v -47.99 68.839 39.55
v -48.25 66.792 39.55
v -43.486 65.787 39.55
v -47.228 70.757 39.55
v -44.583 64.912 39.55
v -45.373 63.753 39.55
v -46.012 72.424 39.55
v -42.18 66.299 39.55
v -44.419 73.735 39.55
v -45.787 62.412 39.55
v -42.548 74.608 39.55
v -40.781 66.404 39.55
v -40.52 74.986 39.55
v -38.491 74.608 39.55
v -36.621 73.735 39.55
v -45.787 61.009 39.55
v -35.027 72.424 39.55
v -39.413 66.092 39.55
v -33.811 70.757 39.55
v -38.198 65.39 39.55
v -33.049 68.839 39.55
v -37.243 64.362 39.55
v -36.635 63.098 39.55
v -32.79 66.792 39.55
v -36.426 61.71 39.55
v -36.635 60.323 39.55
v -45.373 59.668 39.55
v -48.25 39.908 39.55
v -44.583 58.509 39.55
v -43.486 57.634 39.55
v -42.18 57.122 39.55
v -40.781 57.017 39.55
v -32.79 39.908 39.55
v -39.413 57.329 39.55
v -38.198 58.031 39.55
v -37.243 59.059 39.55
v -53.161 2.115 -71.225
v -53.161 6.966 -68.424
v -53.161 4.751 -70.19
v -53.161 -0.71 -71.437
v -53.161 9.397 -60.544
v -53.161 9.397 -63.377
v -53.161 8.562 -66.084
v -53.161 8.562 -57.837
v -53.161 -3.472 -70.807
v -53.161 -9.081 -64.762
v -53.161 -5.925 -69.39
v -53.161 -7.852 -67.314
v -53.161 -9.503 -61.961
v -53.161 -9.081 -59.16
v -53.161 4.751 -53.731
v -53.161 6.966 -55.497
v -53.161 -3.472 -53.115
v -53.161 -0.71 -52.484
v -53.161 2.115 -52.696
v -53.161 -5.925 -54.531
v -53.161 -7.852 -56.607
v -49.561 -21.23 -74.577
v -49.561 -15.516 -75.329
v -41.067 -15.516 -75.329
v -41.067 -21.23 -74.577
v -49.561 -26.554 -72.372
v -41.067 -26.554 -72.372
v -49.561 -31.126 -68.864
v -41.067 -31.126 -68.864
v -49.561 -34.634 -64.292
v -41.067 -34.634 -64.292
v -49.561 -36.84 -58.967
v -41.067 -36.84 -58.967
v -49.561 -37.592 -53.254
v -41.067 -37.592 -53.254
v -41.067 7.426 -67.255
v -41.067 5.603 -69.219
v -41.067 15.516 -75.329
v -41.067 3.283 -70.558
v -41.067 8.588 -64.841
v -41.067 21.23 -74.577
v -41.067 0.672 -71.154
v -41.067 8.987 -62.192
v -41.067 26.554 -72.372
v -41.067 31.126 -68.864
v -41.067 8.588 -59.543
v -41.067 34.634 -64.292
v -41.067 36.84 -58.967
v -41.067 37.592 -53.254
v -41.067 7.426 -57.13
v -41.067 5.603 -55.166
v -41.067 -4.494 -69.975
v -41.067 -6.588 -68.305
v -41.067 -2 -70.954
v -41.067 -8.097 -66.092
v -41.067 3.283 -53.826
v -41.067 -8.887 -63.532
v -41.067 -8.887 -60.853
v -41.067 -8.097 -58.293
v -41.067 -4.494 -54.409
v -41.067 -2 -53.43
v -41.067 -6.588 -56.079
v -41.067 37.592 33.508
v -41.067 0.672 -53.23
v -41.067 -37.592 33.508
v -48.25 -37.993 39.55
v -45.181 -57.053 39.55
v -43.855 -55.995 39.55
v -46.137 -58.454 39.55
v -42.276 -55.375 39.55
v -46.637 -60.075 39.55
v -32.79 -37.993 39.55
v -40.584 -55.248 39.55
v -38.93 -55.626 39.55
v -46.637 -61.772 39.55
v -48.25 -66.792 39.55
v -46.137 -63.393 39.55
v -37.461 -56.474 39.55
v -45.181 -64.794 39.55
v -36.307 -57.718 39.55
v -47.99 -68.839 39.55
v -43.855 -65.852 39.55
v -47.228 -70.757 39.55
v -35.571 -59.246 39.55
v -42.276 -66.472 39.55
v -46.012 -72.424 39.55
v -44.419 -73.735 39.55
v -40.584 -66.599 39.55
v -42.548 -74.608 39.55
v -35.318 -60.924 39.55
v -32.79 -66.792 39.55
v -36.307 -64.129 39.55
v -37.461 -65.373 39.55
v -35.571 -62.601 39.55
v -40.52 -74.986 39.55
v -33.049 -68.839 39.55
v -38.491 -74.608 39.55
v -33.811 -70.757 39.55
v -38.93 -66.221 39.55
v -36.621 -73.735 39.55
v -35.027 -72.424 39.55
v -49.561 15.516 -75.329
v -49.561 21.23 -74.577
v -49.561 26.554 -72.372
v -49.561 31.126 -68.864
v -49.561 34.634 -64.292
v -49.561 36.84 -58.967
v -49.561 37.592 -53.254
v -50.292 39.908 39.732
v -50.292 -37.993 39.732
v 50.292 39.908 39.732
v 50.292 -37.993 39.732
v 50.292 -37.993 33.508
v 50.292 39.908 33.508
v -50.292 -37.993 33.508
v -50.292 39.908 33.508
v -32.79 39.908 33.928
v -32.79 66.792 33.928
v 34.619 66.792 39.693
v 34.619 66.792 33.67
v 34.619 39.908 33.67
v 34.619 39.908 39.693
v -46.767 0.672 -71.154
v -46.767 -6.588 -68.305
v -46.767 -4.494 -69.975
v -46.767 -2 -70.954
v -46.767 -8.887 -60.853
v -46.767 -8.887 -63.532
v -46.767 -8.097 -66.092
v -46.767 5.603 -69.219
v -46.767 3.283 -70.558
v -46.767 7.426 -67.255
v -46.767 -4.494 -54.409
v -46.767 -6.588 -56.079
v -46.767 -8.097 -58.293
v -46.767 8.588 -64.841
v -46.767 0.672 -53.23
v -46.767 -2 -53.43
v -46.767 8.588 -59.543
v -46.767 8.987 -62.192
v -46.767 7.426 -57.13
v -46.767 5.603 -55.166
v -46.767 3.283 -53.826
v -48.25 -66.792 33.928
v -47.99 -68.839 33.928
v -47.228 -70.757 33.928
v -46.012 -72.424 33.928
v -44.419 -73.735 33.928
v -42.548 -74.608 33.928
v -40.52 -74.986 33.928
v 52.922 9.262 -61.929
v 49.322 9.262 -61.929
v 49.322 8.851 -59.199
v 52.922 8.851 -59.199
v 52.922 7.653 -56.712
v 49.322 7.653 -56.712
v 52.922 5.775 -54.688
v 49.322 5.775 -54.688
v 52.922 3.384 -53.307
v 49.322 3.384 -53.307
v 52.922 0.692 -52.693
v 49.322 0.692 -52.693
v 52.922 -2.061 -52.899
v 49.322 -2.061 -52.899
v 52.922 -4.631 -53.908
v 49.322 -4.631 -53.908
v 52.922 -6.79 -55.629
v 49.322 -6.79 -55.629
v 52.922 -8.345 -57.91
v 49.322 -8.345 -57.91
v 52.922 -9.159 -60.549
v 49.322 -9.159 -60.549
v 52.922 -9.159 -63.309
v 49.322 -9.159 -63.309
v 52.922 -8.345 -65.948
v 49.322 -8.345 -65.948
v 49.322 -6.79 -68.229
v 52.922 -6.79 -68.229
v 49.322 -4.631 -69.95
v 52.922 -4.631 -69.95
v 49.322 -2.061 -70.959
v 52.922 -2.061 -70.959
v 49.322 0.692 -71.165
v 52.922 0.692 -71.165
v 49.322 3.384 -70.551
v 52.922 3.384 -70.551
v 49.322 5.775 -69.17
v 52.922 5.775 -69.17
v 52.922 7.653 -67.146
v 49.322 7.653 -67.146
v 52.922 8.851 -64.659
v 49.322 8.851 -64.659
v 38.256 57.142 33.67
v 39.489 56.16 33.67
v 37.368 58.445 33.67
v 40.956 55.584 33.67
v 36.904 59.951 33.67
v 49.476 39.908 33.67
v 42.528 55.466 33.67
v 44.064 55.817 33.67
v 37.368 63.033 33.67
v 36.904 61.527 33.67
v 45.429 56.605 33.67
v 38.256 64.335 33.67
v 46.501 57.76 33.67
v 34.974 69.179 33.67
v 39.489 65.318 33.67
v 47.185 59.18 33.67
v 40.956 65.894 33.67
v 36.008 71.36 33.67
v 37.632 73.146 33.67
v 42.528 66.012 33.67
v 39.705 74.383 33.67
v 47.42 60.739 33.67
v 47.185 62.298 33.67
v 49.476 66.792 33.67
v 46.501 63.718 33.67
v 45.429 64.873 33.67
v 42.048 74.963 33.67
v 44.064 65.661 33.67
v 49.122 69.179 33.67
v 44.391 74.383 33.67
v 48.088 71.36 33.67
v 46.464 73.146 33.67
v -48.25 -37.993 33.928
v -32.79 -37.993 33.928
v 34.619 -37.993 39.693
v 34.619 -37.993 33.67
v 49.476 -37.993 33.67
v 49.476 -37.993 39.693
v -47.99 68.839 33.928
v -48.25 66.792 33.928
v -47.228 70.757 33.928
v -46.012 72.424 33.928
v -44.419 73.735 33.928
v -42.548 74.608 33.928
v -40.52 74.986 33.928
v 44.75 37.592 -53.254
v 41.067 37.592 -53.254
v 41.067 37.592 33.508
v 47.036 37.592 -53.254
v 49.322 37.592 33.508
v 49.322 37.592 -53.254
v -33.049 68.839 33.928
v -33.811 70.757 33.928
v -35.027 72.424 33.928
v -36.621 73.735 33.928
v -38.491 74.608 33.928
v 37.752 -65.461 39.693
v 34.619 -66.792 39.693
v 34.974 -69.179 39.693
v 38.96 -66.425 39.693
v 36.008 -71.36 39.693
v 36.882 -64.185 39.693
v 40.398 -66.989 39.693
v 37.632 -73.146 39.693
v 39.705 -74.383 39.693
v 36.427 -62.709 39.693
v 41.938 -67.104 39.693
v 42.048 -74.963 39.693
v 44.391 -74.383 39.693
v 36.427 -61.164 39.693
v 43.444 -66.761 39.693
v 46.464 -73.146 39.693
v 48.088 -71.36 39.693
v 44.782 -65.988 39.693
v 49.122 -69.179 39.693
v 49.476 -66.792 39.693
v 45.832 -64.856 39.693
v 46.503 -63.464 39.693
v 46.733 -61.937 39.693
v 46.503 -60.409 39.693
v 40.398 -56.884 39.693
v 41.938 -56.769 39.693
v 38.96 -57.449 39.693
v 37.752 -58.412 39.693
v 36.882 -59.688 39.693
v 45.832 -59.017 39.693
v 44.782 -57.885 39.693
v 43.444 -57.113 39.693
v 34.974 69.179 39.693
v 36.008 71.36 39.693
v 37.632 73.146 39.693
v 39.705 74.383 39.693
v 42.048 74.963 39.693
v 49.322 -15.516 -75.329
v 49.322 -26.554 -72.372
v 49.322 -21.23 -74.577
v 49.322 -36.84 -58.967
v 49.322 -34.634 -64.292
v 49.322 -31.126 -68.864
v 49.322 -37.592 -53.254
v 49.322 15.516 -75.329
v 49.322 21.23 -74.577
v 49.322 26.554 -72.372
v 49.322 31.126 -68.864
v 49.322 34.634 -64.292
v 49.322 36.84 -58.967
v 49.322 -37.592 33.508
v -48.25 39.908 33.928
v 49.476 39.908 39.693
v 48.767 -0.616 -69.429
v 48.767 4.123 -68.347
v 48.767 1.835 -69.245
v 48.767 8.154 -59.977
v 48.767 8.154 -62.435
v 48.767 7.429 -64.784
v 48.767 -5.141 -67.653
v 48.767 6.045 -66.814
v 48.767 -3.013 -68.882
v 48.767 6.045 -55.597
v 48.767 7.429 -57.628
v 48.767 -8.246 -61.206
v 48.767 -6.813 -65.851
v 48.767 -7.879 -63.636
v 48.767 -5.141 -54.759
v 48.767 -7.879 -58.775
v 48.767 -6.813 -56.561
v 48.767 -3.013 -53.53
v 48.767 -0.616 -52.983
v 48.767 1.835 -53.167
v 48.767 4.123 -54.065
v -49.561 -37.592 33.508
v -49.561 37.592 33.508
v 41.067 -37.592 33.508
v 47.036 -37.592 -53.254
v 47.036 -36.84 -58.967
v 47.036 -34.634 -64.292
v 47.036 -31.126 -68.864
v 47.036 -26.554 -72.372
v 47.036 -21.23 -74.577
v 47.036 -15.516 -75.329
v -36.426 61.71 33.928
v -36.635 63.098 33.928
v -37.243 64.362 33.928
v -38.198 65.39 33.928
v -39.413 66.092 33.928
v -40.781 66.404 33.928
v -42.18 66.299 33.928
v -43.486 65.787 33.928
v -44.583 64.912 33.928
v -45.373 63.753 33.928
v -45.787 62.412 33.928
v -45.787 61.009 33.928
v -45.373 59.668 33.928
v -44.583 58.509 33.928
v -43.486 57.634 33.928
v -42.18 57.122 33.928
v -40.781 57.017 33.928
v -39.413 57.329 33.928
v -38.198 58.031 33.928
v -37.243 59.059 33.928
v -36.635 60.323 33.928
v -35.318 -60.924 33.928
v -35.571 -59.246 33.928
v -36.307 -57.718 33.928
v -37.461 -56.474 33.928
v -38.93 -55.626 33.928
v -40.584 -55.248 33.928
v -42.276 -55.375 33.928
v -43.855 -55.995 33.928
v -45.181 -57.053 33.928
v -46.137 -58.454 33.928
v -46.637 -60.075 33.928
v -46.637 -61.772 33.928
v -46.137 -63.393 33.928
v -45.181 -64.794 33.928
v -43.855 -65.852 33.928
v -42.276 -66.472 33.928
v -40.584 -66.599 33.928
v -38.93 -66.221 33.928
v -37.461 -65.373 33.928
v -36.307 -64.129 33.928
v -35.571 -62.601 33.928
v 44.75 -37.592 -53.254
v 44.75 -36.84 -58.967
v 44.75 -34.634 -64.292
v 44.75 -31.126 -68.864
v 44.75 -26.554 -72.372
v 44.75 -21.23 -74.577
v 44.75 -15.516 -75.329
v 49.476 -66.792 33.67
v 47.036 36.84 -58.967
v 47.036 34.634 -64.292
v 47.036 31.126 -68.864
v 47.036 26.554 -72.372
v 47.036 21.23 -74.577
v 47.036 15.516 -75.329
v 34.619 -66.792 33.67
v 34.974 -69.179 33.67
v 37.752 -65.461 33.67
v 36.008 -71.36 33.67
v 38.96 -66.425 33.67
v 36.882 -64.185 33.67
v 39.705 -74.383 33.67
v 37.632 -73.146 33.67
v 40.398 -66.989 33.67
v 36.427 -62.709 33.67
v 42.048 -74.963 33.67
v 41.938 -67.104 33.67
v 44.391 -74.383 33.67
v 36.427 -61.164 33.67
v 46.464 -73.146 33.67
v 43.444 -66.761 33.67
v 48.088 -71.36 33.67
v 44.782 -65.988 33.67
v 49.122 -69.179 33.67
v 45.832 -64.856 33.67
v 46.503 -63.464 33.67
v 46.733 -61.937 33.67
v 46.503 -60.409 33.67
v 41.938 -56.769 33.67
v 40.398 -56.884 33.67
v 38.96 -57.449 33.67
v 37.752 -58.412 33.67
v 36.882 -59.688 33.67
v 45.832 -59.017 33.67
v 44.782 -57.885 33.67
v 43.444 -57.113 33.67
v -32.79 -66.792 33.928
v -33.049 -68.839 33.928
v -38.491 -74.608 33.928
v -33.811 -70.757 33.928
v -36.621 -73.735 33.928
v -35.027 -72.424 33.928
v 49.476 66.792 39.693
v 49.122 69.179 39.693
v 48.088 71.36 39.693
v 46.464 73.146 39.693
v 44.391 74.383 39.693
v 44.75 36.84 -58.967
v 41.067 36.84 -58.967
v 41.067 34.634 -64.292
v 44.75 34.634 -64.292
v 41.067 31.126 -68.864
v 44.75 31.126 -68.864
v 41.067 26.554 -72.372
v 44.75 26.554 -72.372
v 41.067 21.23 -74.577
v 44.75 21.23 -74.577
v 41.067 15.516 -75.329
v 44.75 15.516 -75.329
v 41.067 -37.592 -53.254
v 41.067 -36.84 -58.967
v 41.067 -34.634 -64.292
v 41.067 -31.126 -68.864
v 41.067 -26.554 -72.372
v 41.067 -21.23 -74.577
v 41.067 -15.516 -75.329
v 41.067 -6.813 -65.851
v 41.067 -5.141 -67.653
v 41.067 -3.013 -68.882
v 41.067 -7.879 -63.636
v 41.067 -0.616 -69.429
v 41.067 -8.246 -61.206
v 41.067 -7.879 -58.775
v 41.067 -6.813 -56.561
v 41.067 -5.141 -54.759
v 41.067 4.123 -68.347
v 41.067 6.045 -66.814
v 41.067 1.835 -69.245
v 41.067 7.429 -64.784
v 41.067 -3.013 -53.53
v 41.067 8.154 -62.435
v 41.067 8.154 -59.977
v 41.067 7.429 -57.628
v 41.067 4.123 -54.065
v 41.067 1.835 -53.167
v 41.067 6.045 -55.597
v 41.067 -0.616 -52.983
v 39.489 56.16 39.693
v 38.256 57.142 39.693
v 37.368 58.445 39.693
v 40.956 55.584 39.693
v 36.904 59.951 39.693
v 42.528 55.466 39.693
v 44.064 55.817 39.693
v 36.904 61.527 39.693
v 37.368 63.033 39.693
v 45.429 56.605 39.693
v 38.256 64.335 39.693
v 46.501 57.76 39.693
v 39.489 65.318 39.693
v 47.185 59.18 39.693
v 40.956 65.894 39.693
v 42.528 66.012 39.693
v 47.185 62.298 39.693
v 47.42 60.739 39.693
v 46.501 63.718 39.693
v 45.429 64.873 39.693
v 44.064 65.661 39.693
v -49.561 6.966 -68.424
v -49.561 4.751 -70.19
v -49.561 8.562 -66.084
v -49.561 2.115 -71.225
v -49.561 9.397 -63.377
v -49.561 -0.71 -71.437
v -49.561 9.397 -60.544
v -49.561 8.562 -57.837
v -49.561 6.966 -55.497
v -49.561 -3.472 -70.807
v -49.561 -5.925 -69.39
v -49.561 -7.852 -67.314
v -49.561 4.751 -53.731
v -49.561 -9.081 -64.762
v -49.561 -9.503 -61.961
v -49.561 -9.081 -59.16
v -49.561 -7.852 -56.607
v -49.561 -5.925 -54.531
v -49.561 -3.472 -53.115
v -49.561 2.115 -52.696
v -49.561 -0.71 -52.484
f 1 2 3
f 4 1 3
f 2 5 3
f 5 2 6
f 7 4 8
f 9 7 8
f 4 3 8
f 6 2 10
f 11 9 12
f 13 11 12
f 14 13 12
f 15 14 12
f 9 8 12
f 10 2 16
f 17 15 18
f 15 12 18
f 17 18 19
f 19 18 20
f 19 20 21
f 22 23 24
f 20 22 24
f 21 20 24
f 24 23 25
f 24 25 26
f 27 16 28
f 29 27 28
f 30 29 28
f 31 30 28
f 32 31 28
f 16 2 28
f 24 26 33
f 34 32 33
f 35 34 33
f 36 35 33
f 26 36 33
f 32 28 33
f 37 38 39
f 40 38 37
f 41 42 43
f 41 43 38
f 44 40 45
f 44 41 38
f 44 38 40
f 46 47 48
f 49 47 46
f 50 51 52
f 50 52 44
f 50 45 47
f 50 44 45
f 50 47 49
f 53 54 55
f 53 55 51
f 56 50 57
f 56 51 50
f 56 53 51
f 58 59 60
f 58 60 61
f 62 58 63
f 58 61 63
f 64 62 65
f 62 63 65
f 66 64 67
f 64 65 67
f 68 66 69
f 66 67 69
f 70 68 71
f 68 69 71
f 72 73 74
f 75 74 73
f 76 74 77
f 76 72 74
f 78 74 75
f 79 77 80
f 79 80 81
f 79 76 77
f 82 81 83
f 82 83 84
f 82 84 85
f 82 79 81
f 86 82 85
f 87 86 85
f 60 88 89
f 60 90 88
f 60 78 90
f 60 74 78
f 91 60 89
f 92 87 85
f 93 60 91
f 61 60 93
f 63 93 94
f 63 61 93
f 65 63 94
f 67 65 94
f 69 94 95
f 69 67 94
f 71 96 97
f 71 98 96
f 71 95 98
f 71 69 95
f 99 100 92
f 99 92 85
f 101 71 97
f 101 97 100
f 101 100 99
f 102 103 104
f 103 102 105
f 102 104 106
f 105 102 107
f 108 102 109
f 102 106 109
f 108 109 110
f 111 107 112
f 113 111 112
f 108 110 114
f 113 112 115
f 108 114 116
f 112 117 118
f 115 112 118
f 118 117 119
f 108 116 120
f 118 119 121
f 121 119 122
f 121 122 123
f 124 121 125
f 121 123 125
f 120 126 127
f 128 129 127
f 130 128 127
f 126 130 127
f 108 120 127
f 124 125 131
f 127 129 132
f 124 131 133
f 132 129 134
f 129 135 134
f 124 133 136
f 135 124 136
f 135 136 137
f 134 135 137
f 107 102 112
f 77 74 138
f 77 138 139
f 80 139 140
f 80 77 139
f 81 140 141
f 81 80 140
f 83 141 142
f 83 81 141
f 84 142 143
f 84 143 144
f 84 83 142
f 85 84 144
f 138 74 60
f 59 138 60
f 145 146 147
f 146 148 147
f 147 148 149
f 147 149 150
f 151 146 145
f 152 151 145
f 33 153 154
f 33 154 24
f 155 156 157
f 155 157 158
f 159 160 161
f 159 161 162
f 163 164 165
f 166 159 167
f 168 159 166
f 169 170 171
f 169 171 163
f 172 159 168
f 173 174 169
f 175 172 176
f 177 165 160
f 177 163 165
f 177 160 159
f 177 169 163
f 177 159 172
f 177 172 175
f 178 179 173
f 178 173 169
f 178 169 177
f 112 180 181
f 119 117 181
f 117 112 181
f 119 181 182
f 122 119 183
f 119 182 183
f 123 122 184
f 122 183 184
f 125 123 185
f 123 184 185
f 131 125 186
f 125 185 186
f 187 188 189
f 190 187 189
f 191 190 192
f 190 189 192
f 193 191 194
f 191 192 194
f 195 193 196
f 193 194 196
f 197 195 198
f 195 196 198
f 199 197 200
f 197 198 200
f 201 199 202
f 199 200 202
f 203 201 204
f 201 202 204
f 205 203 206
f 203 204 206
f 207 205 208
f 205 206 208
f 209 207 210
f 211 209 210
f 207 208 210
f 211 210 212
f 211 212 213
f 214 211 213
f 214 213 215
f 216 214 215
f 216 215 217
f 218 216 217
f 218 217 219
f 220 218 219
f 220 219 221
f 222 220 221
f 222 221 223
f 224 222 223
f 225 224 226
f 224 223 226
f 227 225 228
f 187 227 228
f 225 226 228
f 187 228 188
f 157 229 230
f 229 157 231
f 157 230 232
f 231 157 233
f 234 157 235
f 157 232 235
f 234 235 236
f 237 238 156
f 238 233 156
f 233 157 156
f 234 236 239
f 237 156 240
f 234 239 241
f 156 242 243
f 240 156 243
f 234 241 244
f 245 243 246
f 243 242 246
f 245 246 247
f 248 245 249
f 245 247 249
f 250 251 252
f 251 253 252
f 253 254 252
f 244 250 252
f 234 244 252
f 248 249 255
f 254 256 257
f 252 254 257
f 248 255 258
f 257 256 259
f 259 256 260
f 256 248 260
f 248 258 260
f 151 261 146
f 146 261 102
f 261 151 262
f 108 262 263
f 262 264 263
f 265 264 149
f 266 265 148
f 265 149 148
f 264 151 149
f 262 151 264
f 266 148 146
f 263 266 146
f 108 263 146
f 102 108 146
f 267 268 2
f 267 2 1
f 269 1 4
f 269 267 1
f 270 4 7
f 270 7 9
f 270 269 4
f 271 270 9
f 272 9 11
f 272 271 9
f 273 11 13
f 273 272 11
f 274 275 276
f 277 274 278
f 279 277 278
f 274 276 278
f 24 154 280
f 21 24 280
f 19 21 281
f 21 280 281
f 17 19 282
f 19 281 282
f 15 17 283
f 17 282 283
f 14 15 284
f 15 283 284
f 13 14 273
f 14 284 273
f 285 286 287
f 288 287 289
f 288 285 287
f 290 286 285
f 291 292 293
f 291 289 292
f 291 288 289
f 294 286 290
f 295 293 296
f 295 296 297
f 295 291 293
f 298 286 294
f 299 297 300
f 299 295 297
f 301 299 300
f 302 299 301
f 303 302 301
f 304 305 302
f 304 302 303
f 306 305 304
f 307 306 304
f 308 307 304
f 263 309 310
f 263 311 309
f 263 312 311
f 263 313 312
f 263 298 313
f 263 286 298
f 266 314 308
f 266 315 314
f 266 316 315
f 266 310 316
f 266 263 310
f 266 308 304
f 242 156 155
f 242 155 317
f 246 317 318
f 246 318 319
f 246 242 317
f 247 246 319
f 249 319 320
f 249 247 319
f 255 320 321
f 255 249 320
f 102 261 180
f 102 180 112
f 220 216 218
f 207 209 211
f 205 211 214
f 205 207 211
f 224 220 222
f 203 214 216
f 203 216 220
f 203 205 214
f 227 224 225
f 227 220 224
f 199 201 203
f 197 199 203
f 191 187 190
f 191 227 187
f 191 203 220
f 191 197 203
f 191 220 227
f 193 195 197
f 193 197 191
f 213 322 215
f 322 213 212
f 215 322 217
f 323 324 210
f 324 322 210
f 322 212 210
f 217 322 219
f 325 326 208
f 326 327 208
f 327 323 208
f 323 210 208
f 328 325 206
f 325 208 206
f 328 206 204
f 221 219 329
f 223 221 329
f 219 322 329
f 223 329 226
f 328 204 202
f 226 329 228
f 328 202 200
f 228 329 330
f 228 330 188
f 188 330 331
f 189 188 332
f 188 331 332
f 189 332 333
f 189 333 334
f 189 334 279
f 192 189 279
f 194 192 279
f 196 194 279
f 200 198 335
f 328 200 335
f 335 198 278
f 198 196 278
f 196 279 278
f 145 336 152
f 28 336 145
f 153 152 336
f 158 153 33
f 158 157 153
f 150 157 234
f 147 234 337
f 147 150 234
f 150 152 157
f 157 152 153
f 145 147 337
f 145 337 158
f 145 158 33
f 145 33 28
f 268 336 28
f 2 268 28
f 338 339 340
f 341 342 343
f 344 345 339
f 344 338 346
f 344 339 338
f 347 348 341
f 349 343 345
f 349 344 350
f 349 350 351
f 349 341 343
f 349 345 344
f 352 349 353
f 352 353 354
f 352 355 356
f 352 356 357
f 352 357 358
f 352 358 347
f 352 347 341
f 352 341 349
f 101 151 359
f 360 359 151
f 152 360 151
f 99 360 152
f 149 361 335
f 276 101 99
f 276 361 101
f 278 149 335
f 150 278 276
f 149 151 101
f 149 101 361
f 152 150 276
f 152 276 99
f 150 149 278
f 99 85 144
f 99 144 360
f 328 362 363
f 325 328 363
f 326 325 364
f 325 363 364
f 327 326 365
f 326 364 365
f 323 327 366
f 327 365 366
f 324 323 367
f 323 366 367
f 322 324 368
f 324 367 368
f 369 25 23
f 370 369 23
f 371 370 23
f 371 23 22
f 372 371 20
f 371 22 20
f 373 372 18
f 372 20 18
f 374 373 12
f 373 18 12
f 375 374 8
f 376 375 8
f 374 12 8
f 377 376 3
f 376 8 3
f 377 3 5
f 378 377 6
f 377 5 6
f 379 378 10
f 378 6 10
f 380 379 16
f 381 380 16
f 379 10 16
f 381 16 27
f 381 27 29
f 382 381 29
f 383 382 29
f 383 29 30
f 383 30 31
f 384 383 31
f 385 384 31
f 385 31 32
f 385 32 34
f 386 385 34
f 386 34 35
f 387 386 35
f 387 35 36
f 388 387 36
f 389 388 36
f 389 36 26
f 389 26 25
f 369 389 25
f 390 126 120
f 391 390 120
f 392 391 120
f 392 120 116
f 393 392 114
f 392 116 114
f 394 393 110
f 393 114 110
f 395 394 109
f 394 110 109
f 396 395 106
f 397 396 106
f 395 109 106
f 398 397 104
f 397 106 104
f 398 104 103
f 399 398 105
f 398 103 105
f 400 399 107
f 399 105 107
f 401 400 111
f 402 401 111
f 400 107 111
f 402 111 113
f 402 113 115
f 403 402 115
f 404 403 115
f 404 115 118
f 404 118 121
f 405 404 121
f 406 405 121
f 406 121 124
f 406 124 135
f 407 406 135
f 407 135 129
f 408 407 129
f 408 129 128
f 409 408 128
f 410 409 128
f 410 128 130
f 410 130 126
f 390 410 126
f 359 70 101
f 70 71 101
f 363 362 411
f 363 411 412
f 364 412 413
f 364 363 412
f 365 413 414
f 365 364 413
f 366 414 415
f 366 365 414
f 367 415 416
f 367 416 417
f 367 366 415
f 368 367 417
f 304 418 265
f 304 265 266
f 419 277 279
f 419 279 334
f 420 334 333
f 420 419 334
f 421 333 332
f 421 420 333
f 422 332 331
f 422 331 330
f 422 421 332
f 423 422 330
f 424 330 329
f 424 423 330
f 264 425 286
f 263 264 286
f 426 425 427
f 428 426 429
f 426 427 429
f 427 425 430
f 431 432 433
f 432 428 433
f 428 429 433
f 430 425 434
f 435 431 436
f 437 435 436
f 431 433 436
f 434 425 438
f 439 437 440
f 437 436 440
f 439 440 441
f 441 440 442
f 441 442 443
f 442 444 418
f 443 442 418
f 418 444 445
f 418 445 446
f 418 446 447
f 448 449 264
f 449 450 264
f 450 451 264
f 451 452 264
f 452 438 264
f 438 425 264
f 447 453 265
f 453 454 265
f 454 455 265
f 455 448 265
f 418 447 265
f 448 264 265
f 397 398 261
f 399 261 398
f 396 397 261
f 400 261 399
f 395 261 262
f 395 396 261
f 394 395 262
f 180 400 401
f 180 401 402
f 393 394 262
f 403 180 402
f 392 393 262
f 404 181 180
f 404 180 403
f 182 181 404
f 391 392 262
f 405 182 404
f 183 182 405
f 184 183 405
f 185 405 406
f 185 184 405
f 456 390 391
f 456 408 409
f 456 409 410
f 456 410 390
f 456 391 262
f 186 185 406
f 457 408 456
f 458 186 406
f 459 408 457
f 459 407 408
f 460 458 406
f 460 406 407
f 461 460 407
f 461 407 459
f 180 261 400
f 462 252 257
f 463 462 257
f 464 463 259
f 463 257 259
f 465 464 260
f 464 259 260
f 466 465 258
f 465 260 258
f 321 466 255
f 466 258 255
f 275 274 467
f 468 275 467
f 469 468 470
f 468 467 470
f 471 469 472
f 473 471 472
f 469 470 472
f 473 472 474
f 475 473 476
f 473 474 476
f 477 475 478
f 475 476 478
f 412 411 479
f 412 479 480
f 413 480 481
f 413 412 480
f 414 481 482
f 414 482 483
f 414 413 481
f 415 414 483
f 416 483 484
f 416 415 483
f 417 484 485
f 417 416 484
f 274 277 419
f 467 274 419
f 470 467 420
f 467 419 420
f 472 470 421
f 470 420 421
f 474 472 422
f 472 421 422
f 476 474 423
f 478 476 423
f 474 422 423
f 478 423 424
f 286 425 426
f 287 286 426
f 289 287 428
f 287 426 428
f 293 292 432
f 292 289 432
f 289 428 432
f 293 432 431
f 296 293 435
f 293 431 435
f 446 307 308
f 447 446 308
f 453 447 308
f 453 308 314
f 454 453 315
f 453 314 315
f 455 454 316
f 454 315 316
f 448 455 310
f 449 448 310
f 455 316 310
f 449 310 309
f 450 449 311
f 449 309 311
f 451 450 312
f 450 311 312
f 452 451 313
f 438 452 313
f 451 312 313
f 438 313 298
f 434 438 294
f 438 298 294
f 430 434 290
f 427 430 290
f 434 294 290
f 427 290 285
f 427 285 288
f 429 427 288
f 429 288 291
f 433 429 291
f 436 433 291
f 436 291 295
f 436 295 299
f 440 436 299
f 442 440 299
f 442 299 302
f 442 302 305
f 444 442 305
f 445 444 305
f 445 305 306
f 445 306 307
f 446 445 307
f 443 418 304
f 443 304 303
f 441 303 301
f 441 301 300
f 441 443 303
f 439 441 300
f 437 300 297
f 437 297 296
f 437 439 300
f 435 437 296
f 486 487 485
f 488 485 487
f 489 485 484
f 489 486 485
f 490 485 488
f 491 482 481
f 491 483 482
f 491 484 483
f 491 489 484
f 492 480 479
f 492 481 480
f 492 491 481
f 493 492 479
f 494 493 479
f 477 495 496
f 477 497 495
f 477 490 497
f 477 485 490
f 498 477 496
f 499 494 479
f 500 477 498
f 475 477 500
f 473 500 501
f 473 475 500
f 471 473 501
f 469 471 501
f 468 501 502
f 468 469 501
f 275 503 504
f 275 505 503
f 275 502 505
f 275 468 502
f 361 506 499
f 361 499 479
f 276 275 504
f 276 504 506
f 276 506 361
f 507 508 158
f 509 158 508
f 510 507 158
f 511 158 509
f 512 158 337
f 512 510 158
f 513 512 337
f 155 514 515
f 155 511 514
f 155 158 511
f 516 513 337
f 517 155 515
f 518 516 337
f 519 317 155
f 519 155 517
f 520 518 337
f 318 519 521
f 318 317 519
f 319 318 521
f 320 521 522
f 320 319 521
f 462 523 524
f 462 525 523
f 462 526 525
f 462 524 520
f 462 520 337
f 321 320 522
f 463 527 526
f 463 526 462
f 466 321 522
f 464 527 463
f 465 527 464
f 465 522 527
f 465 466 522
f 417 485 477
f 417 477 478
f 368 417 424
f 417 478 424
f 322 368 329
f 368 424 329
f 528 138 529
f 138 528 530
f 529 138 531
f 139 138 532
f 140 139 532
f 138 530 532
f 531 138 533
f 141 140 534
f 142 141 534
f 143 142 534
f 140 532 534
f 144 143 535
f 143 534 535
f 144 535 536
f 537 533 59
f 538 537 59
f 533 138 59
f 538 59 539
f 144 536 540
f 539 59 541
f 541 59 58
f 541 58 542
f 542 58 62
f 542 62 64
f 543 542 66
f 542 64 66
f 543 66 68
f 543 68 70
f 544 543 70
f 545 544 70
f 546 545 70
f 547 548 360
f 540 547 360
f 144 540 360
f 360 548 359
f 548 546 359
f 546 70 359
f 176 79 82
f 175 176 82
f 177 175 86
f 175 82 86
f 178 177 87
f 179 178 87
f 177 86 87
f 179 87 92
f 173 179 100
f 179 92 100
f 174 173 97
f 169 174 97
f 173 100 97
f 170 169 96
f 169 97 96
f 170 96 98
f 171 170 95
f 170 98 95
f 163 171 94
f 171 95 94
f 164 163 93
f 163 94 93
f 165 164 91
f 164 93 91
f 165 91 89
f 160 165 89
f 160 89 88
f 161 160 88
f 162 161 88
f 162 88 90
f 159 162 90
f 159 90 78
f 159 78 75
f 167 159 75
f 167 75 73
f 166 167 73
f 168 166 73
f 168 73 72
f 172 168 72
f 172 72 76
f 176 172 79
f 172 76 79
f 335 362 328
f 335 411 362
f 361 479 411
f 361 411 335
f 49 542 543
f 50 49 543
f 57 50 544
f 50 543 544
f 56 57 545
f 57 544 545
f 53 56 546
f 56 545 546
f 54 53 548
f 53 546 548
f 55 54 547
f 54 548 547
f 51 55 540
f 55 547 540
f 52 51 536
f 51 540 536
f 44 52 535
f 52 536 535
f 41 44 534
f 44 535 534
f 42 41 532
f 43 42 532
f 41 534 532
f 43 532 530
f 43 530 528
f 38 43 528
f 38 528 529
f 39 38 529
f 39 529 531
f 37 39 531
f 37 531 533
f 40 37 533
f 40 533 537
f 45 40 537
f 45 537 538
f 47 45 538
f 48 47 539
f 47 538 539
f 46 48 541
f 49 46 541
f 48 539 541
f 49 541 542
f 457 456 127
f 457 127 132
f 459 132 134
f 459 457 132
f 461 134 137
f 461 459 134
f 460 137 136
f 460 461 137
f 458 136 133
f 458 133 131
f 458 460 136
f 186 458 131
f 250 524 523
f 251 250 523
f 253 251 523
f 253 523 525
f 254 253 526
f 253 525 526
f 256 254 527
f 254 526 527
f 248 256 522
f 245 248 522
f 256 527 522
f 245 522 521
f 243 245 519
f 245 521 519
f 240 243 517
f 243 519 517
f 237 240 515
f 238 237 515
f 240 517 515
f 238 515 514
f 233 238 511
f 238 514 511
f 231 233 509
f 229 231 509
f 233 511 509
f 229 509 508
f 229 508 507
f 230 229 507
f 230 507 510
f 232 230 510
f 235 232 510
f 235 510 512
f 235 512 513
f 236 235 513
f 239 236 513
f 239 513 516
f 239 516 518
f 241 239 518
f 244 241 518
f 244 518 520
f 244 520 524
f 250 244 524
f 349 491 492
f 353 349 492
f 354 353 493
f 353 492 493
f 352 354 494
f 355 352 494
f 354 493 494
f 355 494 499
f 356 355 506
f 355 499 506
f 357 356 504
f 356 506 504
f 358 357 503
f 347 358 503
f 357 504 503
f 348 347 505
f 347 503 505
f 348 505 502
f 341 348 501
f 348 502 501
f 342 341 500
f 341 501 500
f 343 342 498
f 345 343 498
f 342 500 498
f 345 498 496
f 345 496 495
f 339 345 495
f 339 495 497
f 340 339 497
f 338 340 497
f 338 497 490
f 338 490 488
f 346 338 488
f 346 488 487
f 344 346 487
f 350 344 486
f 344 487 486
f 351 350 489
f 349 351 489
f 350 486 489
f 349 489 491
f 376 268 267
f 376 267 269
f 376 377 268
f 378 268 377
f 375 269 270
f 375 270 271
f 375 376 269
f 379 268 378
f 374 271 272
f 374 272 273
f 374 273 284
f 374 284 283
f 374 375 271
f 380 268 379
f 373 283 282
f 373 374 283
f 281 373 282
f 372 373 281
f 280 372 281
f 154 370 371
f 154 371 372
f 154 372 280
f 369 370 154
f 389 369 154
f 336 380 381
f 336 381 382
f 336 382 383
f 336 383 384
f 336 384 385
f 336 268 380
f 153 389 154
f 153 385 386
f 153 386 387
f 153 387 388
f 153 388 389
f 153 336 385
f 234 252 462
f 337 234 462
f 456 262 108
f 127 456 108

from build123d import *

# Parameters (mm, degrees)
F0_W         = 77.900249511
F0_H         = 6.2239915133
F1_DEPTH     = 50.292
F2_W         = 5.9690438211
F2_H         = 109.3528494239
F2_W_2       = 6.2078051269
F2_H_2       = 109.8303757608
F3_DEPTH     = 37.592
F4_R         = 22.0755688143
F5_DEPTH     = 2.286
F7_R         = 9.5028337992
F8_DEPTH     = 3.6
F6_R         = 9.2619968466
F9_DEPTH     = 3.6
F10_R        = 8.2457773543
F12_DEPTH    = 7.7
F11_R        = 8.9872233932
F13_DEPTH    = 5.7
F14_W        = 14.8572660983
F14_H        = 6.0232169926
F14_W_2      = 15.4595859349
F14_H_2      = 5.6216679513
F15_DEPTH    = 75
F16_T1_DEPTH = 46.6632985117
F16_T3_DEPTH = 47.064847553
F17_R        = 4.7067592452
F17_R_2      = 5.2876360091
F17_R_3      = 5.6910023403
F17_R_4      = 5.1821036644
F18_DEPTH    = 25


# Not quite as in the source:
# - a fillet or chamfer that OpenCascade refuses, or shapes differently, is made with other operations: its cross-section is extruded or revolved along the edge and cut away or added


with BuildPart() as f1:
    # F0 (on Right) → F1 (new body, symmetric)
    with BuildSketch(Plane.YZ):
        with Locations((0.9574238211, 36.620259285)):
            Rectangle(F0_W, F0_H)
    extrude(amount=F1_DEPTH, both=True)

    # F2 (on Front) → F3 (join, symmetric)
    with BuildSketch(Plane.XZ):
        with Locations((44.0515298396, -20.6528864801)):
            Rectangle(F2_W, F2_H)
        with Locations((-44.1709104925, -20.4141233116)):
            Rectangle(F2_W_2, F2_H_2)
    extrude(amount=F3_DEPTH, both=True)

    # F4
    f4_edges = [f1.edges().sort_by_distance(p)[0] for p in [
        (44.05153, 37.592, -75.329311),
        (44.05153, -37.592, -75.329311),
        (-44.17091, -37.592, -75.329311),
        (-44.17091, 37.592, -75.329311),
    ]]
    fillet(f4_edges, radius=F4_R)

    # F5 (add, symmetric): faces of the model
    f5_faces = [f1.faces().sort_by_distance(p)[0] for p in [
        (47.0360517502, 0, -19.6123684117),
        (-47.274813056, 0, -19.6123684117),
    ]]
    extrude(f5_faces, amount=F5_DEPTH, both=True, dir=(1, 0, 0))

    # F7 (on face) → F8 (join)
    with BuildSketch(Plane(origin=(-49.560813056, 0, 0), x_dir=(0, -1, 0), z_dir=(-1, 0, 0))):
        with Locations((0, -61.9606114924)):
            Circle(F7_R)
    extrude(amount=F8_DEPTH)

    # F6 (on face) → F9 (join)
    with BuildSketch(Plane.YZ.offset(49.3220517502)):
        with Locations((0, -61.9290173054)):
            Circle(F6_R)
    extrude(amount=F9_DEPTH)

    # F10 (on face) → F12 (cut)
    with BuildSketch(Plane(origin=(41.0670079291, 0, 0), x_dir=(0, -1, 0), z_dir=(-1, 0, 0))):
        with Locations((0, -61.2058117986)):
            Circle(F10_R)
    extrude(amount=-F12_DEPTH, mode=Mode.SUBTRACT)

    # F11 (on face) → F13 (cut)
    with BuildSketch(Plane.YZ.offset(-41.0670079291)):
        with Locations((0, -62.1923357248)):
            Circle(F11_R)
    extrude(amount=-F13_DEPTH, mode=Mode.SUBTRACT)

    # F14 (on Front) → F15 (join, symmetric)
    with BuildSketch(Plane.XZ):
        with Locations((42.047848925, 36.6818103939)):
            Rectangle(F14_W, F14_H)
        with Locations((-40.5197497457, 36.7389488965)):
            Rectangle(F14_W_2, F14_H_2)
    extrude(amount=F15_DEPTH, both=True)

    # F16: fillet of radius 8.2083261121 on 8 edges, made by hand

    # F16_s2 → F16_t1 (cut)
    with BuildSketch(Plane.XY.offset(13.4072996407)):
        with BuildLine():
            ThreePointArc((-32.7899567783, 66.7916738879), (-35.1941198343, 72.595836944), (-40.9982828904, 75))
            Line((-40.9982828904, 75), (-32.7899567783, 75))
            Line((-32.7899567783, 75), (-32.7899567783, 66.7916738879))
        make_face()
        with BuildLine():
            ThreePointArc((-48.2495427132, 66.7916738879), (-45.8453796571, 72.595836944), (-40.0412166011, 75))
            Line((-40.0412166011, 75), (-48.2495427132, 75))
            Line((-48.2495427132, 75), (-48.2495427132, 66.7916738879))
        make_face()
        with BuildLine():
            ThreePointArc((-48.2495427132, -66.7916738879), (-45.8453796571, -72.595836944), (-40.0412166011, -75))
            Line((-40.0412166011, -75), (-48.2495427132, -75))
            Line((-48.2495427132, -75), (-48.2495427132, -66.7916738879))
        make_face()
        with BuildLine():
            ThreePointArc((-32.7899567783, -66.7916738879), (-35.1941198343, -72.595836944), (-40.9982828904, -75))
            Line((-40.9982828904, -75), (-32.7899567783, -75))
            Line((-32.7899567783, -75), (-32.7899567783, -66.7916738879))
        make_face()
    extrude(amount=F16_T1_DEPTH, mode=Mode.SUBTRACT)

    # F16_s4 → F16_t3 (cut)
    with BuildSketch(Plane.XY.offset(13.1493866174)):
        with BuildLine():
            ThreePointArc((49.4764819741, 66.7916738879), (47.0723189181, 72.595836944), (41.2681558621, 75))
            Line((41.2681558621, 75), (49.4764819741, 75))
            Line((49.4764819741, 75), (49.4764819741, 66.7916738879))
        make_face()
        with BuildLine():
            ThreePointArc((34.6192158759, 66.7916738879), (37.0233789319, 72.595836944), (42.8275419879, 75))
            Line((42.8275419879, 75), (34.6192158759, 75))
            Line((34.6192158759, 75), (34.6192158759, 66.7916738879))
        make_face()
        with BuildLine():
            ThreePointArc((49.4764819741, -66.7916738879), (47.0723189181, -72.595836944), (41.2681558621, -75))
            Line((41.2681558621, -75), (49.4764819741, -75))
            Line((49.4764819741, -75), (49.4764819741, -66.7916738879))
        make_face()
        with BuildLine():
            ThreePointArc((34.6192158759, -66.7916738879), (37.0233789319, -72.595836944), (42.8275419879, -75))
            Line((42.8275419879, -75), (34.6192158759, -75))
            Line((34.6192158759, -75), (34.6192158759, -66.7916738879))
        make_face()
    extrude(amount=F16_T3_DEPTH, mode=Mode.SUBTRACT)

    # F17 (on face) → F18 (cut)
    with BuildSketch(Plane.XY.offset(39.6934188902)):
        with Locations((-41.1323793232, 61.7104582489)):
            Circle(F17_R)
        with Locations((42.1323850751, 60.7389695942)):
            Circle(F17_R_2)
        with Locations((-41.0092622042, -60.9235055745)):
            Circle(F17_R_3)
        with Locations((41.5508002043, -61.9366765022)):
            Circle(F17_R_4)
    extrude(amount=-F18_DEPTH, mode=Mode.SUBTRACT)


solid = f1.part
